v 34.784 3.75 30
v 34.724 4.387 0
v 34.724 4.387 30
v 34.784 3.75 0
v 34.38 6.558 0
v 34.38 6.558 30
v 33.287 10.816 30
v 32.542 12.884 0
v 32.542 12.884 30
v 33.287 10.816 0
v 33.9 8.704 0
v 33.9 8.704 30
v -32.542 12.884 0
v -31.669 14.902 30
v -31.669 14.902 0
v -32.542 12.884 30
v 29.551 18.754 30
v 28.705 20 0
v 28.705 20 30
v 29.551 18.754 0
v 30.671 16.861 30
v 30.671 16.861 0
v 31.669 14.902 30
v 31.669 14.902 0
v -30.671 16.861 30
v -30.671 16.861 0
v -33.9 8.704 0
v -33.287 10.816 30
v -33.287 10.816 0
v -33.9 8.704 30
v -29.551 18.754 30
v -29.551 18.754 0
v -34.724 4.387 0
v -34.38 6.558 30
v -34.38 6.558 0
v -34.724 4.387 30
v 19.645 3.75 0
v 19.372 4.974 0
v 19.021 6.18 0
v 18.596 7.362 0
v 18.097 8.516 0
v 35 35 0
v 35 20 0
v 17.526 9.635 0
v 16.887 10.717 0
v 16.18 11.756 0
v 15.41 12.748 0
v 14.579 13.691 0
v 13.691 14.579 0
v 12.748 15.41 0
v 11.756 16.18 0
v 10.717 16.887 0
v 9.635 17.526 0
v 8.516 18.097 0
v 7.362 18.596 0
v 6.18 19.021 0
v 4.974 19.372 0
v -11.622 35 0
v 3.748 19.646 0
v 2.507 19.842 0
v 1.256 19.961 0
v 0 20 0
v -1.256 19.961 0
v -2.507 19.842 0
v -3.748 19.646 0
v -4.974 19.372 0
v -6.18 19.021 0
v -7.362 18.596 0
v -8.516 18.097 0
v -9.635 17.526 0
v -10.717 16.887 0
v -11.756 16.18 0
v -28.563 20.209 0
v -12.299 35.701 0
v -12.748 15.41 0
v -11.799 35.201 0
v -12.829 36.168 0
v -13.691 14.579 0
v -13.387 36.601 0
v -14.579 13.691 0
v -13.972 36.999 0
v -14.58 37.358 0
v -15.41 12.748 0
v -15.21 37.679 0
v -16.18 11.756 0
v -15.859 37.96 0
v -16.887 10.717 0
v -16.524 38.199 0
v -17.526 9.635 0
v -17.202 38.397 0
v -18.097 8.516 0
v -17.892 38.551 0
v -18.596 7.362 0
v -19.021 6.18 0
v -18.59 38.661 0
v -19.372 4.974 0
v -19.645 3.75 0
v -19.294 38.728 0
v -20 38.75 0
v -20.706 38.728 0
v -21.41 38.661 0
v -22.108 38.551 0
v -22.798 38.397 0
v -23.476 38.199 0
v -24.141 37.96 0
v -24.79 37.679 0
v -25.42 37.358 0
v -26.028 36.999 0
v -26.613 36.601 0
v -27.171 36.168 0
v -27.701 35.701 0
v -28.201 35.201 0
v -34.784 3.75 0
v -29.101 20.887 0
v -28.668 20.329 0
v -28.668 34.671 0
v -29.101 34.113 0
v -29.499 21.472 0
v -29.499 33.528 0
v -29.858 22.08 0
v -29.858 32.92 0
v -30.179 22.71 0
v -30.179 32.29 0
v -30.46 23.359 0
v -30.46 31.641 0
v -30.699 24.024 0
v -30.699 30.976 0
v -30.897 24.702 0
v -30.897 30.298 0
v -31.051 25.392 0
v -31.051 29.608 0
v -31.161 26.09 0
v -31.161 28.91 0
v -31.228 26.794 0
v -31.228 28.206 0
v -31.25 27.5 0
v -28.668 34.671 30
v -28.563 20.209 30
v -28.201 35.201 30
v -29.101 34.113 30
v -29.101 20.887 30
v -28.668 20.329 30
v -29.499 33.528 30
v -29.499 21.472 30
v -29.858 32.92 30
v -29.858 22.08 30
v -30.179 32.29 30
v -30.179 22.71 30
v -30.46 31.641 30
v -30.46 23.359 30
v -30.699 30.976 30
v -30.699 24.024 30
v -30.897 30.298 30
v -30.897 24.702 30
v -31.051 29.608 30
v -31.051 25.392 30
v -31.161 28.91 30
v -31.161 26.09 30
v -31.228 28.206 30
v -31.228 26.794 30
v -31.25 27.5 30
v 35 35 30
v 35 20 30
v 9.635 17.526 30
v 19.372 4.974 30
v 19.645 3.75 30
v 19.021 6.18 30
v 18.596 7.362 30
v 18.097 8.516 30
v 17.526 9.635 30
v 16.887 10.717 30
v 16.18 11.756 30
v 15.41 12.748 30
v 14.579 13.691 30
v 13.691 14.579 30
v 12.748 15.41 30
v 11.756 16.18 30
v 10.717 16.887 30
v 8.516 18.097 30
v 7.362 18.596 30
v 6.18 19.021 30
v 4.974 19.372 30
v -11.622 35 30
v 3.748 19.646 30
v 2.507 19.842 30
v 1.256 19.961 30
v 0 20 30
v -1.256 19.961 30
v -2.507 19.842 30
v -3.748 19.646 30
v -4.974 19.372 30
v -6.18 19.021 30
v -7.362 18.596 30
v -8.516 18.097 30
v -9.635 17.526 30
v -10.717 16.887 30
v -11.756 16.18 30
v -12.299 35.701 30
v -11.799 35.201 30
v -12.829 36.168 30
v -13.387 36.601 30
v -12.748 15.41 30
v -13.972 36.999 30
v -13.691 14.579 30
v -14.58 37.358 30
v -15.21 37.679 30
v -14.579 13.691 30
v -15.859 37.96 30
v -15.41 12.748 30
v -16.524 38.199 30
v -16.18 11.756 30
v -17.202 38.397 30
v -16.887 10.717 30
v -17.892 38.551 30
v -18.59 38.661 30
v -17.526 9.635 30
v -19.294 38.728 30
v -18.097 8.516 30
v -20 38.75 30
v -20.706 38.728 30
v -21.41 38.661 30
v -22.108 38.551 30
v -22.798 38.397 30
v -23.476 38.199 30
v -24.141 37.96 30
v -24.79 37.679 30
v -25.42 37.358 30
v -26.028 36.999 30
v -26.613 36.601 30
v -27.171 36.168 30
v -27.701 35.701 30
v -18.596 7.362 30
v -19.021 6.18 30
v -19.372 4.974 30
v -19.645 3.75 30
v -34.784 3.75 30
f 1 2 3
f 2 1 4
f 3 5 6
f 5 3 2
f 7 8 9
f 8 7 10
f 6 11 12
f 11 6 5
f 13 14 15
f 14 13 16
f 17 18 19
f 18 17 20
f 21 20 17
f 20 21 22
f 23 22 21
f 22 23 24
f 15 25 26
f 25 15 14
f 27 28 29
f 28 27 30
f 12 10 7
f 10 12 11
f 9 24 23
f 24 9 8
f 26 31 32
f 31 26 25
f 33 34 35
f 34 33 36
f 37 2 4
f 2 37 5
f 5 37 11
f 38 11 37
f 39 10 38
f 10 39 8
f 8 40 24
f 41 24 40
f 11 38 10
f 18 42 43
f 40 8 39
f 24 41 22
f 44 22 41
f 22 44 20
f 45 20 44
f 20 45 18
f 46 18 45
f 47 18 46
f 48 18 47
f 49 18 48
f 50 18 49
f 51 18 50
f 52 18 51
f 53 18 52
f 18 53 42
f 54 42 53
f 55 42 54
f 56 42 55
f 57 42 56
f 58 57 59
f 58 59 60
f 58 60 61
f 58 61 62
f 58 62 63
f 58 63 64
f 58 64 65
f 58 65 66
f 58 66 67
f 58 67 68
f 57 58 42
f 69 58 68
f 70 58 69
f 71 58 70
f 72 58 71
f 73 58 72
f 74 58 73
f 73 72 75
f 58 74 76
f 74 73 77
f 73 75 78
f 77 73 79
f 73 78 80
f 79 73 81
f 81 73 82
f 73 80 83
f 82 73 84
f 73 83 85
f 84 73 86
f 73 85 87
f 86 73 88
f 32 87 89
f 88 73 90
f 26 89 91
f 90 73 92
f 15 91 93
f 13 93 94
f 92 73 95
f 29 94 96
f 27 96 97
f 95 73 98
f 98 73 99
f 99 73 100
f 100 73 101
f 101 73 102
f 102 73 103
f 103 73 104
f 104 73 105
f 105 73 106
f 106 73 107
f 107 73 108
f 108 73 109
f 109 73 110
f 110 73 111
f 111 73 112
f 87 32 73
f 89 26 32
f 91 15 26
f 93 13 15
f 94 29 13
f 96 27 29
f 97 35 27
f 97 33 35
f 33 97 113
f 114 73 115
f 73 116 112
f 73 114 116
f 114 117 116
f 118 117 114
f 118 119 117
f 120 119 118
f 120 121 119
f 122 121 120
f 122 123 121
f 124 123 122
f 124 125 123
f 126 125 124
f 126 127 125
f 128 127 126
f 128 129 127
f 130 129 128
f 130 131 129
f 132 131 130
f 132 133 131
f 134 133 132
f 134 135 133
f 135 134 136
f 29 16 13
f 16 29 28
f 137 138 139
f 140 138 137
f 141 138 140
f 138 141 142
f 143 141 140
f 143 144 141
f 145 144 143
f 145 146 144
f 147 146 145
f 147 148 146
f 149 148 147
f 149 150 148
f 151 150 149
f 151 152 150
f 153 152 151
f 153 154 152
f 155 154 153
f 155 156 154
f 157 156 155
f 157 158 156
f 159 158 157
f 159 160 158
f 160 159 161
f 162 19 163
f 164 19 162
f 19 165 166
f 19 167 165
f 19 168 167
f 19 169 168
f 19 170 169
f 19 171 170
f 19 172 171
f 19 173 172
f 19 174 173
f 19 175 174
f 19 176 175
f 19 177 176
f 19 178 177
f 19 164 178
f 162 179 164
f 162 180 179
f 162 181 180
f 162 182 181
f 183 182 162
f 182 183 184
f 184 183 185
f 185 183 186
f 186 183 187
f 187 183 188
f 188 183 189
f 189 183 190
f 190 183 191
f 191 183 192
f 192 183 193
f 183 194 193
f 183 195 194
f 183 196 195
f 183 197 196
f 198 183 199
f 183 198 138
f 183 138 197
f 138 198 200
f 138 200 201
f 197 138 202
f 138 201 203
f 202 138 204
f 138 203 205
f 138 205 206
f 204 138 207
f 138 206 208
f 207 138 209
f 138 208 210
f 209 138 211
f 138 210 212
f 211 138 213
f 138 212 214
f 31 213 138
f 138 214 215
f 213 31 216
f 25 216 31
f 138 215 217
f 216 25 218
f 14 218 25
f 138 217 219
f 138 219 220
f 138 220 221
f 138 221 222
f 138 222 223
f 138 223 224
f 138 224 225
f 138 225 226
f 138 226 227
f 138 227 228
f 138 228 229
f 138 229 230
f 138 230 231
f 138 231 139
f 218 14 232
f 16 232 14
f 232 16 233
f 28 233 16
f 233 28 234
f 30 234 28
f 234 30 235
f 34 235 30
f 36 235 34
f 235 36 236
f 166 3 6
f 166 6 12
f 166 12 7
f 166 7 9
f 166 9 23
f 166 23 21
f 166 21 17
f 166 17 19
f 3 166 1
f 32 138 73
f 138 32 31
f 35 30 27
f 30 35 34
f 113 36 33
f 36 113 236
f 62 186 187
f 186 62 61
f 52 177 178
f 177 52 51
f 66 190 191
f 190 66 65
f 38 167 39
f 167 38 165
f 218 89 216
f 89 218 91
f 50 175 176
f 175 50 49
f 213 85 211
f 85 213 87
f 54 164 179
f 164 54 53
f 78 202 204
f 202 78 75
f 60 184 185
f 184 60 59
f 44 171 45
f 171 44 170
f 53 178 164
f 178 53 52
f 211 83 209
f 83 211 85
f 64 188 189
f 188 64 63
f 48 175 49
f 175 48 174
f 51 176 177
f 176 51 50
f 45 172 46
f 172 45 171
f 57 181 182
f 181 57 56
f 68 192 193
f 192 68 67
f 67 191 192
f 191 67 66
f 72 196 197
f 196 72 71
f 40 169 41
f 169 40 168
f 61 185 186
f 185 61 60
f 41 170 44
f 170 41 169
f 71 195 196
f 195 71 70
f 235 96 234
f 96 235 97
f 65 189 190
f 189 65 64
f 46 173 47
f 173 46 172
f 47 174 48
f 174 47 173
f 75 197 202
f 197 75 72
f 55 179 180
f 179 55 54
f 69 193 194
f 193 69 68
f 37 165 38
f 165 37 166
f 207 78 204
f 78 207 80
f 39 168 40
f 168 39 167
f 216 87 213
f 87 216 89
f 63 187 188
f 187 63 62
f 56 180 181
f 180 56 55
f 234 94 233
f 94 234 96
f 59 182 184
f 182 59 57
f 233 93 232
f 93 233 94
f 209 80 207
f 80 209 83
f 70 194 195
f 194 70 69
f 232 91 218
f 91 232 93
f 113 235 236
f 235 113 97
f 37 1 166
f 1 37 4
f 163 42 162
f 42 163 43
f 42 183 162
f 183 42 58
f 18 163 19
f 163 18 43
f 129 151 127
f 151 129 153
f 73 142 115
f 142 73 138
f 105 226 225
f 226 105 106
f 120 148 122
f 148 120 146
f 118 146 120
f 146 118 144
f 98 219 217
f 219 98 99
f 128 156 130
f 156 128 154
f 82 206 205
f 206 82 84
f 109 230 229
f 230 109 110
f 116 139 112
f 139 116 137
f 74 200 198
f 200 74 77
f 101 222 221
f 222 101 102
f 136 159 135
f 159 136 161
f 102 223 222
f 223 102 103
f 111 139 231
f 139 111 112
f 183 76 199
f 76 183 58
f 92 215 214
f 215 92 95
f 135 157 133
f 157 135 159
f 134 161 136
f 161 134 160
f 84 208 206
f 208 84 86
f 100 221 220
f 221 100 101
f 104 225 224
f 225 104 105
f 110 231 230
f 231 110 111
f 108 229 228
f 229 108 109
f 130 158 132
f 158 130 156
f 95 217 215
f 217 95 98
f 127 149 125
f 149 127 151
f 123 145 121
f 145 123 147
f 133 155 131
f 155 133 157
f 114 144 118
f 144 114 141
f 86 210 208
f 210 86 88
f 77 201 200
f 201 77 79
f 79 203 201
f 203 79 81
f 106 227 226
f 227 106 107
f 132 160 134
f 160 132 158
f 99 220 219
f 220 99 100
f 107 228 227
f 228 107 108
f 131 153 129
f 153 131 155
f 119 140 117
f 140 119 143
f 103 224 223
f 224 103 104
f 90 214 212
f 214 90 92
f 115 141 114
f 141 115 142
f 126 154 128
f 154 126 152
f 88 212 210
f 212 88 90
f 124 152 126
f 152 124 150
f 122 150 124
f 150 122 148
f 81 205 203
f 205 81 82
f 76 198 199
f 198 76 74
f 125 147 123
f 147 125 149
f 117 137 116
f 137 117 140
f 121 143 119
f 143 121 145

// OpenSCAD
//
// PARAMETRIC POT FEET
//
// For outdoor potted plants:
// Raise your pot off the ground or balcony, to allow for better drainage.
//
// Author: RobotAnna
// https://www.printables.com/@RobotAnna
// CC Public Domain



// PARAMETERS
length    = 70; // length of the semi-circle (front to back of foot)
width     = 30; // width of the foot; 25mm for large pots, 10mm for small pots
thickness = 15; // thickness of the circle; 15mm for large pots, 8mm for small pots
smoothing = 100; // cylinder smoothing: set to 60 while designing, and up to 300 for the final render.

// CONSTANTS

// DERIVED

// MODULES

module foot() {
difference() {

    // colors are not necessary, this just helps to debug the code

    color("Wheat")
    translate([0,0,0])
    cylinder(h=width, d=length, center=false, $fn=smoothing);

    color("LightGreen")
    translate([0,0,0])
    cylinder(h=width, d=length - 2*thickness, center=false, $fn=smoothing);

    color("LightPink")
    translate([-length/2, -length/2, 0])
    cube([length, length/2 + thickness/4, width], center=false);    
}

color("Thistle")
translate([-length/2 + thickness, length/2 - thickness, 0])
cube([length - thickness, thickness, width], center=false); 

color("LightSalmon")
translate([-length/2 + thickness, length/2 - thickness/2, 0])
cylinder(h=width, d=thickness*1.5, center=false, $fn=smoothing); 
}



// PUT IT ALL TOGETHER
foot();

// you can also resize the foot to a specific size, instead of modifying parameters
//resize(newsize=[15, 50, 20]) foot();
